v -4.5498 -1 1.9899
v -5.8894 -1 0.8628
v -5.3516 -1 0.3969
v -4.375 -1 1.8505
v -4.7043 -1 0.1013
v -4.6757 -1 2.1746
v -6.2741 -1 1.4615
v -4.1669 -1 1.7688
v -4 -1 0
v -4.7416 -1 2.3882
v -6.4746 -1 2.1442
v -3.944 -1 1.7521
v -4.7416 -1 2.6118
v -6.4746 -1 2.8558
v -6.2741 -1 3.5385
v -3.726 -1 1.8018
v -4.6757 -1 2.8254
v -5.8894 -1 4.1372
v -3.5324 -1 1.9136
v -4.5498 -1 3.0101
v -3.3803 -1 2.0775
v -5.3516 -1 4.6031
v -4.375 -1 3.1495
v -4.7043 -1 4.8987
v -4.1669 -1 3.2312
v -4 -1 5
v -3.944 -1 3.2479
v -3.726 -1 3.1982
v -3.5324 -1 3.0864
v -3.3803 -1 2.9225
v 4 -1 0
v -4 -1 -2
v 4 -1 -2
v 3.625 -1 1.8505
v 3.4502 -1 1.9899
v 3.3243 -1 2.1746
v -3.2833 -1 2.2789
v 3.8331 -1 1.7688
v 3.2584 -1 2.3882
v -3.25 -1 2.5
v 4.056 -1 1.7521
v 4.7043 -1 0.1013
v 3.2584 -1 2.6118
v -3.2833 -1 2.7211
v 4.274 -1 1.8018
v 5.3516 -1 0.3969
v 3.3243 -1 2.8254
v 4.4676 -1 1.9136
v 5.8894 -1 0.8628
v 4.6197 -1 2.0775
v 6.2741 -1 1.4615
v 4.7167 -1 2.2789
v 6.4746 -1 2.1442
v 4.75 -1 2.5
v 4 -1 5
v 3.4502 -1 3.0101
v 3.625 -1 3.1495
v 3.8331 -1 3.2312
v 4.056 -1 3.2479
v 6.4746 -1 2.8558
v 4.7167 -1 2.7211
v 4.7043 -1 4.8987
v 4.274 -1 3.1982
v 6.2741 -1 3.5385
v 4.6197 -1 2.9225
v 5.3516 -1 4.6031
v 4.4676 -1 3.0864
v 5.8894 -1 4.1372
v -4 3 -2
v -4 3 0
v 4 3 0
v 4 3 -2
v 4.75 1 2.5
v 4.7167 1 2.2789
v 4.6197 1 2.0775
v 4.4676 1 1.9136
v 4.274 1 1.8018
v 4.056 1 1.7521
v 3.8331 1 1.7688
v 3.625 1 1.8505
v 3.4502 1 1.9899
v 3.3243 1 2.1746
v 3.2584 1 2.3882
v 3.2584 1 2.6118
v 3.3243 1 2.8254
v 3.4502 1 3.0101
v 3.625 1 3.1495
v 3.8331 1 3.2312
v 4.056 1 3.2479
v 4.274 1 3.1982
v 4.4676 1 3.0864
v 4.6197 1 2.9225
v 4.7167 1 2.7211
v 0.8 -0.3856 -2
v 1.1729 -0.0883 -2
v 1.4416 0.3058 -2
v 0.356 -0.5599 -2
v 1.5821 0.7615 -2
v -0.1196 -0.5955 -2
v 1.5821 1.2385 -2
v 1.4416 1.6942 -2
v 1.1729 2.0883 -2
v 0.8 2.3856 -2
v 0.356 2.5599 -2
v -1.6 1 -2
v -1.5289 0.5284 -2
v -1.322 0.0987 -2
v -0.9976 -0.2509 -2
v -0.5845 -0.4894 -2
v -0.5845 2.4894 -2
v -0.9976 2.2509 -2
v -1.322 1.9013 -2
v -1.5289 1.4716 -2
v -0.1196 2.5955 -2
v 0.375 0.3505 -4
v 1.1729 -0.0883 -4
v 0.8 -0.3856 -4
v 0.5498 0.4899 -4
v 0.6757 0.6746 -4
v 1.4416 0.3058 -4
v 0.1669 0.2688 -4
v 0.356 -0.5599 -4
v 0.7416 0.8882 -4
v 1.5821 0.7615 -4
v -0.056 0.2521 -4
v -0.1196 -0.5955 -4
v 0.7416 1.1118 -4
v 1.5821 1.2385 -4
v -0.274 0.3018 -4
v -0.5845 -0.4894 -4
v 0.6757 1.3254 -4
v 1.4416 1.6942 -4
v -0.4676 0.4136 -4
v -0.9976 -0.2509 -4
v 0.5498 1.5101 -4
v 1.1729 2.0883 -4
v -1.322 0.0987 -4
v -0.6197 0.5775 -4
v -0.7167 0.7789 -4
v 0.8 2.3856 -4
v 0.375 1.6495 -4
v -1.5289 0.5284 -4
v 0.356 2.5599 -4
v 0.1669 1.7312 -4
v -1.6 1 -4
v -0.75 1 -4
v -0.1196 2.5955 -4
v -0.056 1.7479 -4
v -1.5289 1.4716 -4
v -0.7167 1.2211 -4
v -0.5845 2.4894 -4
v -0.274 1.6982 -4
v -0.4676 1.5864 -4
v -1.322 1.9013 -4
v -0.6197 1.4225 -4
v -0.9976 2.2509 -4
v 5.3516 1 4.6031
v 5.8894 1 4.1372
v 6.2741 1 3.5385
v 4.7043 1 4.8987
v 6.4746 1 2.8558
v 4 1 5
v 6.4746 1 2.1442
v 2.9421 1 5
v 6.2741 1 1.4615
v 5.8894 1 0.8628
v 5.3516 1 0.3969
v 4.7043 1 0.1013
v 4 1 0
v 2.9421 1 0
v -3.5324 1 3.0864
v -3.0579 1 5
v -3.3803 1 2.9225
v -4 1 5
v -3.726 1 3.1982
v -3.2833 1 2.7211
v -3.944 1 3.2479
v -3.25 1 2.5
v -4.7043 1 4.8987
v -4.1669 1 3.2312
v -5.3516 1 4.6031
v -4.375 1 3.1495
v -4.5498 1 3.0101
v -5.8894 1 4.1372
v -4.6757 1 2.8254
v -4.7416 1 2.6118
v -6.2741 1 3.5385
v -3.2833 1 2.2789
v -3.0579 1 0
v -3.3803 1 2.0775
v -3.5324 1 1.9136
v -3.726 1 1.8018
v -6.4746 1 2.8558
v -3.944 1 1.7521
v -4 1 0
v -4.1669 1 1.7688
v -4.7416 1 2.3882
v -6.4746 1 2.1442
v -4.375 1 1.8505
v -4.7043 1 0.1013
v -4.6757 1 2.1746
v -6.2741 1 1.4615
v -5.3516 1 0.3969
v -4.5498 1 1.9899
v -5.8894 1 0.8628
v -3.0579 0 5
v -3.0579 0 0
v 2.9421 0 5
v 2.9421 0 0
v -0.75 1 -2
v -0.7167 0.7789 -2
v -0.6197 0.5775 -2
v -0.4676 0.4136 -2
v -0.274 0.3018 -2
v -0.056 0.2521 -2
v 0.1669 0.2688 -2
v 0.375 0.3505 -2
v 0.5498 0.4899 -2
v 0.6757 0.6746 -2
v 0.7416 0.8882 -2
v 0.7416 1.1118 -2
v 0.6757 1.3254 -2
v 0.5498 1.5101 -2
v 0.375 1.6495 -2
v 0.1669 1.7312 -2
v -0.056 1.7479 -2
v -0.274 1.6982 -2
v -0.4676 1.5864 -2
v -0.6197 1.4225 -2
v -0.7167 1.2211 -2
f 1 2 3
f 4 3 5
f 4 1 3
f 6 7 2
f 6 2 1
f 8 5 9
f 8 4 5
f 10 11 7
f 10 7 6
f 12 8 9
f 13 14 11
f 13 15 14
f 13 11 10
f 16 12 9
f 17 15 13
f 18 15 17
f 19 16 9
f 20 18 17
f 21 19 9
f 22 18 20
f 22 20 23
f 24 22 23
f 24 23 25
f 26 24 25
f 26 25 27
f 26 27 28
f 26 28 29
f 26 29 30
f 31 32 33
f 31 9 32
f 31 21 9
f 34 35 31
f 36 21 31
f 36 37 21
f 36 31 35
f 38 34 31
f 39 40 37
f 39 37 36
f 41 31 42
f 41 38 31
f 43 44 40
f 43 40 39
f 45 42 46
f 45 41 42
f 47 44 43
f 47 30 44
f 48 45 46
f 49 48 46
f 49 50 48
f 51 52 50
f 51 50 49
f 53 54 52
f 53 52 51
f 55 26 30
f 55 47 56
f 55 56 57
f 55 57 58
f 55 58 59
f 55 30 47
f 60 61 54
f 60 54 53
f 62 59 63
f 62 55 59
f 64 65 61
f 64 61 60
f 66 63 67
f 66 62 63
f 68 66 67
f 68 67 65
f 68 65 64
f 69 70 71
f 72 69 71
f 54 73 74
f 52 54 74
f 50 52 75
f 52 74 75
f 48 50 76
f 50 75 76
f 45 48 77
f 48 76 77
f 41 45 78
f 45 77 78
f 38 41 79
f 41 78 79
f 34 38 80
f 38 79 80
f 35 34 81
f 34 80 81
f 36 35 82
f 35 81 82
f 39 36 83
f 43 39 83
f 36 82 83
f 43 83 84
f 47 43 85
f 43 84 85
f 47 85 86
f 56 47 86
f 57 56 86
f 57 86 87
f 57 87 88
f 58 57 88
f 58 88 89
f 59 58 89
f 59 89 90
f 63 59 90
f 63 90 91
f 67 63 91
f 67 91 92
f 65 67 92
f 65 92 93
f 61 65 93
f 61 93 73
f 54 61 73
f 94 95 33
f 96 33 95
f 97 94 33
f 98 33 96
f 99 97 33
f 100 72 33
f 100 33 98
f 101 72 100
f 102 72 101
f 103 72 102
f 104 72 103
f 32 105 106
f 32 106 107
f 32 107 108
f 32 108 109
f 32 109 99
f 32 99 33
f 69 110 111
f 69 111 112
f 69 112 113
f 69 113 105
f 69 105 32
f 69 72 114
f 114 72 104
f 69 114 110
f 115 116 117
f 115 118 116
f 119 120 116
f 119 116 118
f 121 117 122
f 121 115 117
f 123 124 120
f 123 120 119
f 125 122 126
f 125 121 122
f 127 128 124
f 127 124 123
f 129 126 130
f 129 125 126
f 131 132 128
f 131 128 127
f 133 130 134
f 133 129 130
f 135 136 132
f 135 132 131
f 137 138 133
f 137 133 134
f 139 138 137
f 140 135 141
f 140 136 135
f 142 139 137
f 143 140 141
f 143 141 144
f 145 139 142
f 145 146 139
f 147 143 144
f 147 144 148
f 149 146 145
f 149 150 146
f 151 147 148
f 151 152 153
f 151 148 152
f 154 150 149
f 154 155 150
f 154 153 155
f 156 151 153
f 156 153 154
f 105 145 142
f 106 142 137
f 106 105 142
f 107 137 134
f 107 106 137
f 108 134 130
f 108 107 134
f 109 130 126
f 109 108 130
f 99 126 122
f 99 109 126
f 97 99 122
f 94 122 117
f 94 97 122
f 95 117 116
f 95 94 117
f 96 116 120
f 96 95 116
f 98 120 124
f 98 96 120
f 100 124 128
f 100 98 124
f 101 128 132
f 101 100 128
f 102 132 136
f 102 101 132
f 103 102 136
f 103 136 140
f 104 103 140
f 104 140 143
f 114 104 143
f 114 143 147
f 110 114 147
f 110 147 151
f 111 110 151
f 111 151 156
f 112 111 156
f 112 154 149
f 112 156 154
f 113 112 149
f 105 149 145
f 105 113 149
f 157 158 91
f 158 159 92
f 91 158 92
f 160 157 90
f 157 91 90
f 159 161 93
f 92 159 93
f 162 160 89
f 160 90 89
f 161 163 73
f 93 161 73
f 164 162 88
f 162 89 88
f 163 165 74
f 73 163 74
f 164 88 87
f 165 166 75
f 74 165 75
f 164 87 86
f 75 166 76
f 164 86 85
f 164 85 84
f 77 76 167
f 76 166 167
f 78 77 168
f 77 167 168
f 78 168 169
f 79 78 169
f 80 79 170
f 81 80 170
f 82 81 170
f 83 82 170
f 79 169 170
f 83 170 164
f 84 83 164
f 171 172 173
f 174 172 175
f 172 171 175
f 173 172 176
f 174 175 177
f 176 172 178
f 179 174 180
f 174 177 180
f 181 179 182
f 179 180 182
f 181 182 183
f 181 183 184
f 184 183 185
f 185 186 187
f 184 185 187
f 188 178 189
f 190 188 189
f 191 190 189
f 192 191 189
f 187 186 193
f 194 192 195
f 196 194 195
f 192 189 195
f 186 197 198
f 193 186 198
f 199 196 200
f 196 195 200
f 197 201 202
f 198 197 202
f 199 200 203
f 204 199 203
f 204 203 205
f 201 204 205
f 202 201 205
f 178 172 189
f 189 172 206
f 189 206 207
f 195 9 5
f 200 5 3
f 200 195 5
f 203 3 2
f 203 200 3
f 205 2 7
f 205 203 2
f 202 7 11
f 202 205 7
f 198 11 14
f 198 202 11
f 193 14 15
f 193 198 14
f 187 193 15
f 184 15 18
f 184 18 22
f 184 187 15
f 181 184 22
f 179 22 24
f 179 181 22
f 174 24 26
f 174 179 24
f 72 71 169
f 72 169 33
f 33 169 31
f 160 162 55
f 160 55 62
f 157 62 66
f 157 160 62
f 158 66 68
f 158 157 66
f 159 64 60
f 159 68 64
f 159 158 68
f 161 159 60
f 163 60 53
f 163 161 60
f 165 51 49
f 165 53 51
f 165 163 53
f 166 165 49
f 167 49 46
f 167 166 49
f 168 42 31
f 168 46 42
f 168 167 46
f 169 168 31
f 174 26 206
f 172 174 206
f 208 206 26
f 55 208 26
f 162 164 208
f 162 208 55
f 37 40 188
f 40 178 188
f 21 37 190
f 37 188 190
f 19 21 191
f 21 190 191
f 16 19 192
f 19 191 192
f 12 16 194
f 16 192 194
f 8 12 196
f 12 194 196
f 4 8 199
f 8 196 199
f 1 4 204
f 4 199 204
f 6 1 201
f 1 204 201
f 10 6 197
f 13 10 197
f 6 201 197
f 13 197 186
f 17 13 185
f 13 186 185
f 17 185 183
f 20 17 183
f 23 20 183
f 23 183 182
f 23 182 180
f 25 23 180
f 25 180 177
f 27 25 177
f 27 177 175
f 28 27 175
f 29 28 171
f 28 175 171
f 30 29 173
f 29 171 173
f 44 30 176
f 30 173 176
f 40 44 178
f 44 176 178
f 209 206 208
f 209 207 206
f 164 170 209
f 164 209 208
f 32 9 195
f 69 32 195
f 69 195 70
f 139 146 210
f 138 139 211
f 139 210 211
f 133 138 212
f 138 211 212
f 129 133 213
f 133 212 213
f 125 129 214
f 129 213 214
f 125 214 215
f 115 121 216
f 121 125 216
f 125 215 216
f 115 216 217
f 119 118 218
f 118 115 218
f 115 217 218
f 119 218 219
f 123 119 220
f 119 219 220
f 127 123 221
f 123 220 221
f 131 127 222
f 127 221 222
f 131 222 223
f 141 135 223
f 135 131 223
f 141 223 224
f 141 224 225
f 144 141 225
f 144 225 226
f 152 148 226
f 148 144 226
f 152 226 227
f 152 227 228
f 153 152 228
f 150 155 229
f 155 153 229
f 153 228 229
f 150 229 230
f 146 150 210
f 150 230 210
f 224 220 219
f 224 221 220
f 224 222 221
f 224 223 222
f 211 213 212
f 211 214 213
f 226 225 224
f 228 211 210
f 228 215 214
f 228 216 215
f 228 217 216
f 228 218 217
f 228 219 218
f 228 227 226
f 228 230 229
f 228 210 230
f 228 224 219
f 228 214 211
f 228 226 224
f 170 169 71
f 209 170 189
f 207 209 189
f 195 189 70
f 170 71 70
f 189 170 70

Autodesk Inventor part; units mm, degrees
ref_plane "YZ Plane" through (0, 0, 0) normal (1, 0, 0) x (0, 1, 0)
ref_plane "XZ Plane" through (0, 0, 0) normal (0, 1, 0) x (-1, 0, 0)
ref_plane "XY Plane" through (0, 0, 0) normal (0, 0, 1) x (1, 0, 0)
sketch "Эскиз1" plane through (0, 0, 0) normal (0, 0, 1) x (1, 0, 0)
  line L0 (-4, -1) -> (4, -1)
  line L1 (4, -1) -> (4, 1)
  line L2 (4, 1) -> (-4, 1)
  line L3 (-4, 1) -> (-4, -1)
  line L4 (-4, -1) -> (4, 1) construction
  line L5 (4, -1) -> (-4, 1) construction
  point P0 (0, 0)
  dimension "d0" = 8
  dimension "d1" = 2
extrude "Выдавливание1" add sketch "Эскиз1" along normal blind 5
sketch "Эскиз2" plane through (-4, 1, 0) normal (0, 1, 0) x (1, 0, 0)
  line L0 (0, 0) -> (0, -5) projected
  circle A0 centre (0, -2.5) radius 2.5
  line L1 (8, 0) -> (8, -5) projected
  circle A1 centre (8, -2.5) radius 2.5
  point P0 (4, 0)
  dimension "d4" = 5
  dimension "d5" = 5
extrude "Выдавливание2" add sketch "Эскиз2" against normal blind 2
sketch "Эскиз3" plane through (-4, 1, 0) normal (0, 1, 0) x (1, 0, 0)
  arc A0 (0, 0) -> (0, -5) centre (0, -2.5) ccw projected
  circle A1 centre (0, -2.5) radius 0.75
  arc A2 (8, -5) -> (8, 0) centre (8, -2.5) ccw projected
  circle A3 centre (8, -2.5) radius 0.75
  point P0 (4, 0)
  dimension "d8" = 1.5
  dimension "d9" = 1.5
extrude "Выдавливание3" cut sketch "Эскиз3" against normal blind 2
sketch "Эскиз4" plane through (-4, 1, 0) normal (0, 1, 0) x (1, 0, 0)
  line L0 (4, 0) -> (4, -5)
  line L1 (0, -5) -> (8, -5) projected
  line L2 (0, 0) -> (8, 0) projected
  line L3 (6.9421, -5) -> (0.9421, -5)
  line L4 (0.9421, -5) -> (0.9421, 0)
  line L5 (0.9421, 0) -> (6.9421, 0)
  line L6 (6.9421, 0) -> (6.9421, -5)
  line L7 (6.9421, -5) -> (0.9421, 0) construction
  line L8 (0.9421, -5) -> (6.9421, 0) construction
  point P0 (3.9421, -2.5)
  dimension "d12" = 6
extrude "Выдавливание4" cut sketch "Эскиз4" against normal blind 1
sketch "Эскиз5" plane through (0, 0, 0) normal (0, 0, -1) x (-1, 0, 0)
  line L0 (-3.25, -1) -> (-4.75, -1) projected
  line L1 (-4, -1) -> (4, -1)
  line L2 (4, -1) -> (4, 3)
  line L3 (4, 3) -> (-4, 3)
  line L4 (-4, 3) -> (-4, -1)
  point P0 (0, 0)
  dimension "d15" = 8
  dimension "d16" = 4
extrude "Выдавливание5" add sketch "Эскиз5" along normal blind 2
sketch "Эскиз6" plane through (0, 0, -2) normal (0, 0, -1) x (-1, 0, 0)
  line L0 (-4, 3) -> (-4, 1) projected
  line L1 (-4, 1) -> (4, 1)
  line L2 (3.25, 1) -> (4.75, 1) projected
  circle A0 centre (0, 1) radius 0.75
  circle A1 centre (0, 1) radius 1.6
  point P0 (0, 0)
  dimension "d19" = 1.5
  dimension "d20" = 3.2
extrude "Выдавливание6" add sketch "Эскиз6" along normal blind 2 contours A0 L1 A1 | L1 A1 A0
sketch "Эскиз7" plane through (-4, 1, 5) normal (0, 1, 0) x (1, 0, 0)
  circle A0 centre (0, 2.5) radius 0.75 projected
  line L0 (0.9421, 0) -> (0.9421, 5) projected
  line L1 (0.9421, 5) -> (0, 5) projected
  arc A1 (0, 5) -> (0, 0) centre (0, 2.5) ccw projected
  line L2 (0.9421, 0) -> (0, 0) projected
  line L3 (0.9421, 0) -> (0.9421, 5) projected
  line L4 (6.9421, 0) -> (0.9421, 0) projected
  line L5 (6.9421, 5) -> (6.9421, 0) projected
  line L6 (0.9421, 5) -> (6.9421, 5) projected
  circle A2 centre (8, 2.5) radius 0.75 projected
  line L7 (6.9421, 5) -> (6.9421, 0) projected
  line L8 (8, 0) -> (6.9421, 0) projected
  arc A3 (8, 0) -> (8, 5) centre (8, 2.5) ccw projected
  line L9 (8, 5) -> (6.9421, 5) projected
  point P0 (4, 5)
properties part number "КВ33.044.206 - Крепеж держателя ремня" material "Пластик АБС"
